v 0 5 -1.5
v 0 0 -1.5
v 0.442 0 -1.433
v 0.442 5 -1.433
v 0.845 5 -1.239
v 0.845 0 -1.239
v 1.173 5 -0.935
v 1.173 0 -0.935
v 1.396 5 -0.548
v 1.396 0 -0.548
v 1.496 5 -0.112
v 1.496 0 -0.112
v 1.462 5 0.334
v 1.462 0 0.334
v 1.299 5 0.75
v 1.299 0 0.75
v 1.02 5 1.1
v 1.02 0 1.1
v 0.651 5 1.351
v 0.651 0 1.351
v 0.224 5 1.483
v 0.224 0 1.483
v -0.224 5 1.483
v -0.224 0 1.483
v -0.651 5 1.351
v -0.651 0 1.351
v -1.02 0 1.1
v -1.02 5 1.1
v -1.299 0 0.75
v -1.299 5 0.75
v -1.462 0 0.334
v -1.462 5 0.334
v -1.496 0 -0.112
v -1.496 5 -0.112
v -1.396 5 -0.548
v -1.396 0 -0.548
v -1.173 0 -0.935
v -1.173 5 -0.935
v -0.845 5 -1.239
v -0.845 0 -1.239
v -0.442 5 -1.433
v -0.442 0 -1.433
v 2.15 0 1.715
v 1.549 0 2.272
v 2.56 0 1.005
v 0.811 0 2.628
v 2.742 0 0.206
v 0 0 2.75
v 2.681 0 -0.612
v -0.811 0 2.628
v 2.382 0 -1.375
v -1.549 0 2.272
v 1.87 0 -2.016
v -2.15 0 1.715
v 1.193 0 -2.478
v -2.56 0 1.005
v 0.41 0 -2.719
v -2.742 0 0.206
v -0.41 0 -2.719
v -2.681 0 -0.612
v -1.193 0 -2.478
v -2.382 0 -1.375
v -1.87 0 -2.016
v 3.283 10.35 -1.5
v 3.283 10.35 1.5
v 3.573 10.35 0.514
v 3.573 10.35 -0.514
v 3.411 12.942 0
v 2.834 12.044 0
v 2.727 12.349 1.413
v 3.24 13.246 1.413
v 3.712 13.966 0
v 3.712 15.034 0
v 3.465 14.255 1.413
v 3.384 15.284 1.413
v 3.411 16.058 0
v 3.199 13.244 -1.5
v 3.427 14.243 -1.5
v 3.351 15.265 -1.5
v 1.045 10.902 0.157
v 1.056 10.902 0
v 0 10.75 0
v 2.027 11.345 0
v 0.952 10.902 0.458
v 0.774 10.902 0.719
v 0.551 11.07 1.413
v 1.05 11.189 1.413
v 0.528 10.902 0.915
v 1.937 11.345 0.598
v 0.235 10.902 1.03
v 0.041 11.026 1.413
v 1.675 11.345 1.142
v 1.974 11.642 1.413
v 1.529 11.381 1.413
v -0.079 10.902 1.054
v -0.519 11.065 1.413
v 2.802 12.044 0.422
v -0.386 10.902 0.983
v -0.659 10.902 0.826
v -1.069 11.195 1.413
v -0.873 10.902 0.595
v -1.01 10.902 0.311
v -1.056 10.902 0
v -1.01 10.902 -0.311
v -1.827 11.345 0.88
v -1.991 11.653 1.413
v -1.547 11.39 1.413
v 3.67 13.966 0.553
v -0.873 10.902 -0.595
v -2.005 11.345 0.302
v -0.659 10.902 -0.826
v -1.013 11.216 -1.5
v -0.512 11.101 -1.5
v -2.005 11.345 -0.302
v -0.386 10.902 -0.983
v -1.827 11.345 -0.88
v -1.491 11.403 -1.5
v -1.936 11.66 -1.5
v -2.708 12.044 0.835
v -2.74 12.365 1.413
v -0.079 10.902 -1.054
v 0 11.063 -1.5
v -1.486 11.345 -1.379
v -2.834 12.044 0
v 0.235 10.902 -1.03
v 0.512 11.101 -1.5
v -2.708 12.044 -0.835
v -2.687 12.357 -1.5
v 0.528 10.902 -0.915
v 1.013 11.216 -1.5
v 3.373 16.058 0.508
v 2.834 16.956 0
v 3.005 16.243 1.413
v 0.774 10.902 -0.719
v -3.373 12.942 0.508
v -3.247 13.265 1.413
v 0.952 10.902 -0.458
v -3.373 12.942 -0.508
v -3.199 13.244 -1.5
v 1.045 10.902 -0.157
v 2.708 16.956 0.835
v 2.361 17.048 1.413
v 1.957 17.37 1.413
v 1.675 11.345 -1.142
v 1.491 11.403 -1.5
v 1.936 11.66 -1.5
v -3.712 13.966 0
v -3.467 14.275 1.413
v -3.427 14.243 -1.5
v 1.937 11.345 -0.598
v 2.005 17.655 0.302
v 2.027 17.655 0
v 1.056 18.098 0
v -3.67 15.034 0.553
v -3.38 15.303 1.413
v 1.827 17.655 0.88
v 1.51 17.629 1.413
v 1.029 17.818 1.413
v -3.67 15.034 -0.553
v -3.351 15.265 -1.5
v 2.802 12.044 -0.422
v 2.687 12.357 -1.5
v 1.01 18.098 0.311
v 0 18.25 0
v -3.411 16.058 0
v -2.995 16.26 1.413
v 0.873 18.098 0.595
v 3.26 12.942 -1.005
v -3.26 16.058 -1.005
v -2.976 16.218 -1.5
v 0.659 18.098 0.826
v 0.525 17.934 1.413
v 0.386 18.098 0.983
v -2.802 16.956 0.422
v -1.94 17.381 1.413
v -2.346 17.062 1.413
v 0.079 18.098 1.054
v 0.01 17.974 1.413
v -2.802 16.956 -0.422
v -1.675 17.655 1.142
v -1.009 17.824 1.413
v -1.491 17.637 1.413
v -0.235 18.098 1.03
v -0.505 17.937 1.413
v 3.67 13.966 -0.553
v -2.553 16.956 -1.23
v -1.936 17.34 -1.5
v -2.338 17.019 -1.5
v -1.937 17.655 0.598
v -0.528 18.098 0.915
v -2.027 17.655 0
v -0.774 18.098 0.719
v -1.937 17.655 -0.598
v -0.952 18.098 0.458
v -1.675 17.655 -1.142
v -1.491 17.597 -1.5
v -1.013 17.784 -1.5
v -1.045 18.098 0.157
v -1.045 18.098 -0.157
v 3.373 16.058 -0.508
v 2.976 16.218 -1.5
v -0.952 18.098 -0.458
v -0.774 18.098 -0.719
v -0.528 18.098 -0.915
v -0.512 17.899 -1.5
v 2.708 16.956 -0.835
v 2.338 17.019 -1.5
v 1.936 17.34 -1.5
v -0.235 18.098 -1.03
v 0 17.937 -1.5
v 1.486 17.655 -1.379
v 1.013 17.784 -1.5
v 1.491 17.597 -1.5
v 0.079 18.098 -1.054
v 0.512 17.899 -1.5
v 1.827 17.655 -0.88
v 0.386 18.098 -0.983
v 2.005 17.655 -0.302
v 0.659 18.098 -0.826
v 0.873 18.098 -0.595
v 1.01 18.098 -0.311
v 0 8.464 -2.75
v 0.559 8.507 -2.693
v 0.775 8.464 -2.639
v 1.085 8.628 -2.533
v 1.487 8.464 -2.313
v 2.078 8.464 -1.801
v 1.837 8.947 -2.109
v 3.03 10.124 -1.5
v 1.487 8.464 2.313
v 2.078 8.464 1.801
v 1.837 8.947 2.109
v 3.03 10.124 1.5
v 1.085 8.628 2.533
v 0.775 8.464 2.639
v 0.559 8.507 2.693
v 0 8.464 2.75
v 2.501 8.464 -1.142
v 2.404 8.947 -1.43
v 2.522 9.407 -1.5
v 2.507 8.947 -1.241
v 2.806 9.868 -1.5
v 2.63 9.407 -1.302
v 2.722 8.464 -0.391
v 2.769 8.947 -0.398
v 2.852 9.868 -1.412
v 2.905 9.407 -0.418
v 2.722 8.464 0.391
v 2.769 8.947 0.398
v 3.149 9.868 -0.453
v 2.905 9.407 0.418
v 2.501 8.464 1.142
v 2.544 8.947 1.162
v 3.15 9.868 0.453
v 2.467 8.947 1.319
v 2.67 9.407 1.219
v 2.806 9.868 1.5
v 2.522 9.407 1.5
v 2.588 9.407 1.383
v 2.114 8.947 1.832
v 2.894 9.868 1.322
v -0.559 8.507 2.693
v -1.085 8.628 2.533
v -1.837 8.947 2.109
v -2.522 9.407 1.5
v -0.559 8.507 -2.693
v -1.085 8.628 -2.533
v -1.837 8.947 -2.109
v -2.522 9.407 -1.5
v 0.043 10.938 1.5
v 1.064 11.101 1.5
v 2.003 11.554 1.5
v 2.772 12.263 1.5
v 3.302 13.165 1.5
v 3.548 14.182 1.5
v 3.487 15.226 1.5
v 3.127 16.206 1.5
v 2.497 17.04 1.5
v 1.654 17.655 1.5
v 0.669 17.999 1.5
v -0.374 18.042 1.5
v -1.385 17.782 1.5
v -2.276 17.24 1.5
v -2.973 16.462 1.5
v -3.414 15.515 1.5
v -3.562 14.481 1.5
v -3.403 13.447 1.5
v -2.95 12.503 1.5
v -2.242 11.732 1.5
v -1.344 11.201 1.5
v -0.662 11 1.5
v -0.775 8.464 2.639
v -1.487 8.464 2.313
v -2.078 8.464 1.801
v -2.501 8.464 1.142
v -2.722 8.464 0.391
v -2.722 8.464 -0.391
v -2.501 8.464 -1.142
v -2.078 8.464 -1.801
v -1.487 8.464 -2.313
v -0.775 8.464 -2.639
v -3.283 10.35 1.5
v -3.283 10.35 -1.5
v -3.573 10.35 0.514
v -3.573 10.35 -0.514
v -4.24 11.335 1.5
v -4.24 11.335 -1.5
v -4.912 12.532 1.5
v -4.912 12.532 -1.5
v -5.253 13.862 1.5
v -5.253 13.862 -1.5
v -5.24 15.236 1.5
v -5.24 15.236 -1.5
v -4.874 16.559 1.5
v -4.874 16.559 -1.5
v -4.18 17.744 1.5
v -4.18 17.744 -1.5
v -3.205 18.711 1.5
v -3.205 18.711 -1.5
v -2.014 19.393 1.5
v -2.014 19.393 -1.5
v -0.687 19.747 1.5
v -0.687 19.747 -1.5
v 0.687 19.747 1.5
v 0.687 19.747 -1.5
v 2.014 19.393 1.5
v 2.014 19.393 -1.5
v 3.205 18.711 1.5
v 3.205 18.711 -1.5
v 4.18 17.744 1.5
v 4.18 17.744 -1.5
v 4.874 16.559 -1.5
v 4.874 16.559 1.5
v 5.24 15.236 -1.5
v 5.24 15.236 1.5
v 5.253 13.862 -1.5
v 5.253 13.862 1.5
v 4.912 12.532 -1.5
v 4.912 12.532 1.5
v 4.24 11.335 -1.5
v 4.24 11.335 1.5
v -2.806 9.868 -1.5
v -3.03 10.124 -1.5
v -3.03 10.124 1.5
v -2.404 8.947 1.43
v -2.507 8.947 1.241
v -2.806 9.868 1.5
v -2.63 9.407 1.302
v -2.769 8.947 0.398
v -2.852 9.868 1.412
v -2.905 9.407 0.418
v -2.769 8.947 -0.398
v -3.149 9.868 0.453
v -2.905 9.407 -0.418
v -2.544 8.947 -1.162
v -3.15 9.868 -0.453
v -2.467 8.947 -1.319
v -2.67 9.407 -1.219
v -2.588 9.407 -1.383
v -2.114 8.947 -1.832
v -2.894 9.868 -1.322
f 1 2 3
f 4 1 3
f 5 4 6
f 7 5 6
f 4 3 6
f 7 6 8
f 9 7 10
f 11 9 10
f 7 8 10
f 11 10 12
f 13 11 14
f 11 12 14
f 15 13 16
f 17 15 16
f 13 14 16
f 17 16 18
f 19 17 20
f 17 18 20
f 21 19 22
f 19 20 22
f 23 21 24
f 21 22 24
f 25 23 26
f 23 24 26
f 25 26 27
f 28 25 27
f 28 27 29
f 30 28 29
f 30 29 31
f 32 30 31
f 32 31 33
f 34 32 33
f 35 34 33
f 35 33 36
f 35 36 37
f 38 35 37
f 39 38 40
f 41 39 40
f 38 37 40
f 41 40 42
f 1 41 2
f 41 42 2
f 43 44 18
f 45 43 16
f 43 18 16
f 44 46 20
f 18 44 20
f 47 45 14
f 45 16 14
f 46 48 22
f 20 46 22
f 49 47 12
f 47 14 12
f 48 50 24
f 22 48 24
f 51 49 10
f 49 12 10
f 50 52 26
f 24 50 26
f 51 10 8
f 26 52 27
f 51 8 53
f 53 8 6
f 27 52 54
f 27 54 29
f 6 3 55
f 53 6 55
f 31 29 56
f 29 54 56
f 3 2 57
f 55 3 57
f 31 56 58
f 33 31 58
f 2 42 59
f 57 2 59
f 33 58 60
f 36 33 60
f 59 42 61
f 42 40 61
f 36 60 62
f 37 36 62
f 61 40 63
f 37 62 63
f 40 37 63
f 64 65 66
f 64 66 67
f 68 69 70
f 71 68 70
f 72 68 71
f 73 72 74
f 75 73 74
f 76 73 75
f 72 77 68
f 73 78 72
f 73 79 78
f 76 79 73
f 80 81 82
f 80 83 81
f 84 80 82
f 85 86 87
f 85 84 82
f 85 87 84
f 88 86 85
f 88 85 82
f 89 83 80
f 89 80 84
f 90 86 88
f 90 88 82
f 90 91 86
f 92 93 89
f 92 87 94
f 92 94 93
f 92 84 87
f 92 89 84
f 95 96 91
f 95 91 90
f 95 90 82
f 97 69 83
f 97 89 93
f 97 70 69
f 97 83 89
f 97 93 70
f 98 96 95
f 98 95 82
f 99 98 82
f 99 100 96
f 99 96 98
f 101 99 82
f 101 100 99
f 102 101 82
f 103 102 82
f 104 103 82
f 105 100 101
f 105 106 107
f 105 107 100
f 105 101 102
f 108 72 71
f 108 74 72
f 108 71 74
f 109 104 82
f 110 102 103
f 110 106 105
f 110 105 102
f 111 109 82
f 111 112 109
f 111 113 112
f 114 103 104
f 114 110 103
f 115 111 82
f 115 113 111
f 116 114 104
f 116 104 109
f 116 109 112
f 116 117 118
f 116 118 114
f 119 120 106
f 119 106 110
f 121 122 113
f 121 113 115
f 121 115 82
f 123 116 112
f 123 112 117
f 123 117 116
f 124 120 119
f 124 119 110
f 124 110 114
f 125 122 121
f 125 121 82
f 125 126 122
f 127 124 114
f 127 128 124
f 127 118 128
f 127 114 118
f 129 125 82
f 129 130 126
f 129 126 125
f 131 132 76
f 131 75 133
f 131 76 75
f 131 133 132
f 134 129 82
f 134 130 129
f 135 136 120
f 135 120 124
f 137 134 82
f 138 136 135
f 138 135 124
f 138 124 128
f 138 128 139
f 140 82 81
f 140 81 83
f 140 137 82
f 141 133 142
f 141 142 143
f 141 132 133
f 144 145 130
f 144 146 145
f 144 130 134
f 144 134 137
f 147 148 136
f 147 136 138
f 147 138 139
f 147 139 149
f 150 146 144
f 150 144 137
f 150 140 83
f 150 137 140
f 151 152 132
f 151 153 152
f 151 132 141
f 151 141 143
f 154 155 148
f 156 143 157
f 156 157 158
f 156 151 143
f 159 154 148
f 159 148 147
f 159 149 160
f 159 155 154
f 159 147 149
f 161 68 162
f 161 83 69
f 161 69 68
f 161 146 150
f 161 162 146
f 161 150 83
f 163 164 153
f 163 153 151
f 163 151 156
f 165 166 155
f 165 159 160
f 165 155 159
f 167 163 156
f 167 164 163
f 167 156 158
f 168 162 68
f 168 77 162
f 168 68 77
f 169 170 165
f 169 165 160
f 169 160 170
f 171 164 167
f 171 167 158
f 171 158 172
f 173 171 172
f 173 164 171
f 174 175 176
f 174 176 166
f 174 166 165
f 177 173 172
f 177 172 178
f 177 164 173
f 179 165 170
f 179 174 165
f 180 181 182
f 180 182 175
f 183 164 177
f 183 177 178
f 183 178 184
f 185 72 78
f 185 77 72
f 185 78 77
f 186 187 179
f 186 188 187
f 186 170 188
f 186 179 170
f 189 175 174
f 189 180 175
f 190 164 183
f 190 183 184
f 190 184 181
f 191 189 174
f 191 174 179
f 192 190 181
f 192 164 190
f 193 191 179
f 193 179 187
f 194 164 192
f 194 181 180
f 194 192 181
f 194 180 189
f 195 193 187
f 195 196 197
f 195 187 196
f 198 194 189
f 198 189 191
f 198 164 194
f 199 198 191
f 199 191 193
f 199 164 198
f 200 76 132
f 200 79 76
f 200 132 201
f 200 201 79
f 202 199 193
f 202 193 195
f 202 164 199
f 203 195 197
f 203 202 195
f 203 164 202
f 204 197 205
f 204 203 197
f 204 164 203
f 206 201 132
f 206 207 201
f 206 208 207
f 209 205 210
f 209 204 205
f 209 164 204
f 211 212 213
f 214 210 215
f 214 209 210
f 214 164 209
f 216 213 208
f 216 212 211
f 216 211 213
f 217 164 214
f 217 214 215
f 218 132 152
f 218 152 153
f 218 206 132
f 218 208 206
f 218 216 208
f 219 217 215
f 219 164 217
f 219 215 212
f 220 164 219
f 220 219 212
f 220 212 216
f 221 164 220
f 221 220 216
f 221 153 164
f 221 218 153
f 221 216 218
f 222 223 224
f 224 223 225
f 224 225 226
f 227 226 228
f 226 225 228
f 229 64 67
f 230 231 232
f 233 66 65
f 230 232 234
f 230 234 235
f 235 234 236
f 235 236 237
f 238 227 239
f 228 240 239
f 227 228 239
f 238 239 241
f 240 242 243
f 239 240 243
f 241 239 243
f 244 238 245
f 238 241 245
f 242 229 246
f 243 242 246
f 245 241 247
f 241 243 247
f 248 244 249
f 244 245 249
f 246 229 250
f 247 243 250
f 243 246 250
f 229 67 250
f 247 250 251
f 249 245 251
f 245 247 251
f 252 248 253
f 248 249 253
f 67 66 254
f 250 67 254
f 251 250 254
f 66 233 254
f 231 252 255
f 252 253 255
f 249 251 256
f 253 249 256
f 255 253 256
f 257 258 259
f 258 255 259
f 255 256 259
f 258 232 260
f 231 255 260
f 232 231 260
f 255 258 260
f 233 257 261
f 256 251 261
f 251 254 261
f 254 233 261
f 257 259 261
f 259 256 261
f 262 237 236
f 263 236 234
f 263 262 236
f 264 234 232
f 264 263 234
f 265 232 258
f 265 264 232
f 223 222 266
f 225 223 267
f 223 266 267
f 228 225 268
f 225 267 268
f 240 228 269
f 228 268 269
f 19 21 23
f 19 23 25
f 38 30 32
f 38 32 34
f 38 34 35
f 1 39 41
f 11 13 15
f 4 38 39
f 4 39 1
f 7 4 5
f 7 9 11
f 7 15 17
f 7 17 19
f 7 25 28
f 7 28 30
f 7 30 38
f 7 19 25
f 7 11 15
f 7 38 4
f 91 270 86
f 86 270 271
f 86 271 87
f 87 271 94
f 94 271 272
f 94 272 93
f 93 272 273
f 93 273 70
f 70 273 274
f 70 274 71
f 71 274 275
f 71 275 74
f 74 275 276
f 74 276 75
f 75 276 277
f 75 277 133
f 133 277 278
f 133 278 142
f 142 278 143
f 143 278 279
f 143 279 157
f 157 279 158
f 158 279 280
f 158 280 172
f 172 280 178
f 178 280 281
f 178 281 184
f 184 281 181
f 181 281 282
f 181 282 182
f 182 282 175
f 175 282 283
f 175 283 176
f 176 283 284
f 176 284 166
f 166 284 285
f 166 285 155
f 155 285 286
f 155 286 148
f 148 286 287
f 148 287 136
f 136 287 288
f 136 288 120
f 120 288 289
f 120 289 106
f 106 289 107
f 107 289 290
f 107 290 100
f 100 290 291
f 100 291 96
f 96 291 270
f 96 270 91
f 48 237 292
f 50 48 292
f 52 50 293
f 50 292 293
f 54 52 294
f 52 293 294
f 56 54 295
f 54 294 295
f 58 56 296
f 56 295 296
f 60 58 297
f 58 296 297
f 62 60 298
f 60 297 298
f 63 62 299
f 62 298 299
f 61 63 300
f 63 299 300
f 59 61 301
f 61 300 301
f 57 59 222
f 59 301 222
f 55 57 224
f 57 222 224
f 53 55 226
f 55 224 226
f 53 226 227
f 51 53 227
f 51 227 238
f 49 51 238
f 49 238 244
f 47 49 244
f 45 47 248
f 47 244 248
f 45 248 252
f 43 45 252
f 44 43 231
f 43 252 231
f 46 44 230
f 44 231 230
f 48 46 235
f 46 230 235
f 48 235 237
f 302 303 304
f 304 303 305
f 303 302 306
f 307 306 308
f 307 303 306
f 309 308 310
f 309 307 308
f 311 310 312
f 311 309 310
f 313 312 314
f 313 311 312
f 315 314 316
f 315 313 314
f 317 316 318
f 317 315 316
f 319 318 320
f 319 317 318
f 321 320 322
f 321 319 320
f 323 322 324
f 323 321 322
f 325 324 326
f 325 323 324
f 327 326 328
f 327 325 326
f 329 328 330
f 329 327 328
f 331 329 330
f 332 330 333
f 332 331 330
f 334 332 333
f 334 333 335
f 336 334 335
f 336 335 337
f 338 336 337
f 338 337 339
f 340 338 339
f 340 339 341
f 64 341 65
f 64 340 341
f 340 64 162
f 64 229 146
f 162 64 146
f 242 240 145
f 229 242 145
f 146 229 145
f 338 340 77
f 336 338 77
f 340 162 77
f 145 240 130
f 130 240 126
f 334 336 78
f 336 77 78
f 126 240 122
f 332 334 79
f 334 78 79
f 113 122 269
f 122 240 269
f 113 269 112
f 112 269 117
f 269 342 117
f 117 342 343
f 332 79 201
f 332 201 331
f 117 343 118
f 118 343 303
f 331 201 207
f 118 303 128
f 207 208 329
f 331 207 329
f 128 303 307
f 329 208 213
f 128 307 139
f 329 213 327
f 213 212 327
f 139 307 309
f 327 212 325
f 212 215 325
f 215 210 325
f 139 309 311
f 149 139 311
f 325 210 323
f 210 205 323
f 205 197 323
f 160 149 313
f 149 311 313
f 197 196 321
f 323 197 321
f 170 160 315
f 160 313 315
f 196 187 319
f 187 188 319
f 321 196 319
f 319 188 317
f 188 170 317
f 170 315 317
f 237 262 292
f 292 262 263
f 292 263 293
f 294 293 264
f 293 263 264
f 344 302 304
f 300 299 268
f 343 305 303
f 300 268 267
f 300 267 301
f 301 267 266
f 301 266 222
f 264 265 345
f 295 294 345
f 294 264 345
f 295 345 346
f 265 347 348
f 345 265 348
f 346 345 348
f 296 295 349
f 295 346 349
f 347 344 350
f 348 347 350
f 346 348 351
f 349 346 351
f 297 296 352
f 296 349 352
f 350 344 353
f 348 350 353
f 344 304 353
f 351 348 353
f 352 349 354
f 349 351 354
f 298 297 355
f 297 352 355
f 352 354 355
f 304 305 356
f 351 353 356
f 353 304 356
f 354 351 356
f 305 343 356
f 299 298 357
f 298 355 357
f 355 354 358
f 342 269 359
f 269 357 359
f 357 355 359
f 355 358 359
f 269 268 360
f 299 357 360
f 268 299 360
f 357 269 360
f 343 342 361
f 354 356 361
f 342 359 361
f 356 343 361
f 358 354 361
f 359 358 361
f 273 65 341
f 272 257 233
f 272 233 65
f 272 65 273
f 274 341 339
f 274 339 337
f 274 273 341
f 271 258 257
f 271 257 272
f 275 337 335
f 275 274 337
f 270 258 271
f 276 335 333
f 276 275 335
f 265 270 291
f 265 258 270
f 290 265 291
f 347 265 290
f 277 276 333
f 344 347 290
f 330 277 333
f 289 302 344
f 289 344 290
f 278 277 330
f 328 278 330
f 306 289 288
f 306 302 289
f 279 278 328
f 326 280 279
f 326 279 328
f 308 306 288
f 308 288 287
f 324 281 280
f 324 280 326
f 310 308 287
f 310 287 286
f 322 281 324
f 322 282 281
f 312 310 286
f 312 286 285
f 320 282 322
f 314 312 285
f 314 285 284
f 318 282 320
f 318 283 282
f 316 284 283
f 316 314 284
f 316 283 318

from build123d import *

# Parameters (mm, degrees)
CUT_EXTRUDE1_DEPTH      = 22.459263734
CUT_EXTRUDE1_DEPTH_BACK = 22.459263734
CUT_EXTRUDE2_DEPTH      = 21.923969522
CUT_EXTRUDE2_DEPTH_BACK = 21.923969522
SKETCH3_R               = 3
CHAMFER1_SIZE           = 0.125
CHAMFER1_SIZE2          = 0.094947636
CUT_EXTRUDE3_DEPTH      = 22.17339134
CUT_EXTRUDE3_DEPTH_BACK = 22.17339134
SKETCH7_R               = 1.5
CUT_EXTRUDE4_DEPTH      = 5


with BuildPart() as part:
    # Sketch1 → Revolve1 (revolve)
    with BuildSketch(Plane.XY, mode=Mode.PRIVATE) as revolve1_sk:
        with BuildLine():
            Line((0, 11), (0, 0))
            Line((0, 0), (2.75, 0))
            Line((2.75, 0), (2.75, 8.463651766))
            ThreePointArc((2.75, 8.463651766), (2.97496566, 9.500097013), (3.609375, 10.350010589))
            ThreePointArc((3.609375, 10.350010589), (5.151453278, 16.426792444), (0, 20))
            Line((0, 20), (0, 11))
        make_face()
    revolve(revolve1_sk.sketch.rotate(Axis((0, 0, 0), (0, -1, 0)), 90), axis=Axis((0, 0, 0), (0, -1, 0)))

    # Sketch2 → Cut-Extrude1 (cut, two sides: drawn at the far end of the back side and taken through both)
    with BuildSketch(Plane(origin=(0, 0, 0), x_dir=(0, 0, -1), z_dir=(1, 0, 0)).offset(-CUT_EXTRUDE1_DEPTH_BACK)):
        Polygon((-6.5, 9.406831178), (-2.75, 8.463651766), (-1.5, 9.406831178), (-1.5, 20.406831178), (-6.5, 20.406831178), align=None)
        Polygon((6.5, 20.406831178), (6.5, 9.406831178), (2.75, 8.463651766), (1.5, 9.406831178), (1.5, 20.406831178), align=None)
    extrude(amount=CUT_EXTRUDE1_DEPTH + CUT_EXTRUDE1_DEPTH_BACK, mode=Mode.SUBTRACT)

    # Sketch3 → Cut-Extrude2 (cut, two sides: drawn at the far end of the back side and taken through both)
    with BuildSketch(Plane.XY.offset(-CUT_EXTRUDE2_DEPTH_BACK)):
        with Locations(Location((0, 14.5, 0), (0, 0, 90))):
            Circle(SKETCH3_R)
    extrude(amount=CUT_EXTRUDE2_DEPTH + CUT_EXTRUDE2_DEPTH_BACK, mode=Mode.SUBTRACT)

    # Sketch5 → Cut-Revolve2 (revolve, cut)
    with BuildSketch(Plane.XY):
        with BuildLine():
            Line((0, 18.25), (0, 10.75))
            ThreePointArc((0, 10.75), (3.75, 14.5), (0, 18.25))
        make_face()
    revolve(axis=Axis((0, 18.25, 0), (0, -1, 0)), mode=Mode.SUBTRACT)

    # Chamfer1
    chamfer1_edges = [part.edges().sort_by_distance(p)[0] for p in [
        (0, 17.936931771, 1.5),
    ]]
    chamfer1_side = [part.faces().sort_by_distance(p)[0] for p in [
        (0, 9.555101677, 1.5),
    ]]
    chamfer(chamfer1_edges, length=CHAMFER1_SIZE, length2=CHAMFER1_SIZE2, reference=chamfer1_side[0])

    # Sketch6 → Cut-Extrude3 (cut, two sides: drawn at the far end of the back side and taken through both)
    with BuildSketch(Plane.XY.offset(1.5).offset(-CUT_EXTRUDE3_DEPTH_BACK)):
        with BuildLine():
            Line((-3.609375, 10.350010589), (-3.28292368, 10.350010589))
            ThreePointArc((-3.28292368, 10.350010589), (0, 19.791502622), (3.28292368, 10.350010589))
            Line((3.28292368, 10.350010589), (3.609375, 10.350010589))
            ThreePointArc((3.609375, 10.350010589), (0, 20), (-3.609375, 10.350010589))
        make_face()
    extrude(amount=CUT_EXTRUDE3_DEPTH + CUT_EXTRUDE3_DEPTH_BACK, mode=Mode.SUBTRACT)

    # Sketch7 → Cut-Extrude4 (cut)
    with BuildSketch(Plane.XZ):
        with Locations(Location((0, 0, 0), (0, 0, 270))):
            Circle(SKETCH7_R)
    extrude(amount=-CUT_EXTRUDE4_DEPTH, mode=Mode.SUBTRACT)


solid = part.part
